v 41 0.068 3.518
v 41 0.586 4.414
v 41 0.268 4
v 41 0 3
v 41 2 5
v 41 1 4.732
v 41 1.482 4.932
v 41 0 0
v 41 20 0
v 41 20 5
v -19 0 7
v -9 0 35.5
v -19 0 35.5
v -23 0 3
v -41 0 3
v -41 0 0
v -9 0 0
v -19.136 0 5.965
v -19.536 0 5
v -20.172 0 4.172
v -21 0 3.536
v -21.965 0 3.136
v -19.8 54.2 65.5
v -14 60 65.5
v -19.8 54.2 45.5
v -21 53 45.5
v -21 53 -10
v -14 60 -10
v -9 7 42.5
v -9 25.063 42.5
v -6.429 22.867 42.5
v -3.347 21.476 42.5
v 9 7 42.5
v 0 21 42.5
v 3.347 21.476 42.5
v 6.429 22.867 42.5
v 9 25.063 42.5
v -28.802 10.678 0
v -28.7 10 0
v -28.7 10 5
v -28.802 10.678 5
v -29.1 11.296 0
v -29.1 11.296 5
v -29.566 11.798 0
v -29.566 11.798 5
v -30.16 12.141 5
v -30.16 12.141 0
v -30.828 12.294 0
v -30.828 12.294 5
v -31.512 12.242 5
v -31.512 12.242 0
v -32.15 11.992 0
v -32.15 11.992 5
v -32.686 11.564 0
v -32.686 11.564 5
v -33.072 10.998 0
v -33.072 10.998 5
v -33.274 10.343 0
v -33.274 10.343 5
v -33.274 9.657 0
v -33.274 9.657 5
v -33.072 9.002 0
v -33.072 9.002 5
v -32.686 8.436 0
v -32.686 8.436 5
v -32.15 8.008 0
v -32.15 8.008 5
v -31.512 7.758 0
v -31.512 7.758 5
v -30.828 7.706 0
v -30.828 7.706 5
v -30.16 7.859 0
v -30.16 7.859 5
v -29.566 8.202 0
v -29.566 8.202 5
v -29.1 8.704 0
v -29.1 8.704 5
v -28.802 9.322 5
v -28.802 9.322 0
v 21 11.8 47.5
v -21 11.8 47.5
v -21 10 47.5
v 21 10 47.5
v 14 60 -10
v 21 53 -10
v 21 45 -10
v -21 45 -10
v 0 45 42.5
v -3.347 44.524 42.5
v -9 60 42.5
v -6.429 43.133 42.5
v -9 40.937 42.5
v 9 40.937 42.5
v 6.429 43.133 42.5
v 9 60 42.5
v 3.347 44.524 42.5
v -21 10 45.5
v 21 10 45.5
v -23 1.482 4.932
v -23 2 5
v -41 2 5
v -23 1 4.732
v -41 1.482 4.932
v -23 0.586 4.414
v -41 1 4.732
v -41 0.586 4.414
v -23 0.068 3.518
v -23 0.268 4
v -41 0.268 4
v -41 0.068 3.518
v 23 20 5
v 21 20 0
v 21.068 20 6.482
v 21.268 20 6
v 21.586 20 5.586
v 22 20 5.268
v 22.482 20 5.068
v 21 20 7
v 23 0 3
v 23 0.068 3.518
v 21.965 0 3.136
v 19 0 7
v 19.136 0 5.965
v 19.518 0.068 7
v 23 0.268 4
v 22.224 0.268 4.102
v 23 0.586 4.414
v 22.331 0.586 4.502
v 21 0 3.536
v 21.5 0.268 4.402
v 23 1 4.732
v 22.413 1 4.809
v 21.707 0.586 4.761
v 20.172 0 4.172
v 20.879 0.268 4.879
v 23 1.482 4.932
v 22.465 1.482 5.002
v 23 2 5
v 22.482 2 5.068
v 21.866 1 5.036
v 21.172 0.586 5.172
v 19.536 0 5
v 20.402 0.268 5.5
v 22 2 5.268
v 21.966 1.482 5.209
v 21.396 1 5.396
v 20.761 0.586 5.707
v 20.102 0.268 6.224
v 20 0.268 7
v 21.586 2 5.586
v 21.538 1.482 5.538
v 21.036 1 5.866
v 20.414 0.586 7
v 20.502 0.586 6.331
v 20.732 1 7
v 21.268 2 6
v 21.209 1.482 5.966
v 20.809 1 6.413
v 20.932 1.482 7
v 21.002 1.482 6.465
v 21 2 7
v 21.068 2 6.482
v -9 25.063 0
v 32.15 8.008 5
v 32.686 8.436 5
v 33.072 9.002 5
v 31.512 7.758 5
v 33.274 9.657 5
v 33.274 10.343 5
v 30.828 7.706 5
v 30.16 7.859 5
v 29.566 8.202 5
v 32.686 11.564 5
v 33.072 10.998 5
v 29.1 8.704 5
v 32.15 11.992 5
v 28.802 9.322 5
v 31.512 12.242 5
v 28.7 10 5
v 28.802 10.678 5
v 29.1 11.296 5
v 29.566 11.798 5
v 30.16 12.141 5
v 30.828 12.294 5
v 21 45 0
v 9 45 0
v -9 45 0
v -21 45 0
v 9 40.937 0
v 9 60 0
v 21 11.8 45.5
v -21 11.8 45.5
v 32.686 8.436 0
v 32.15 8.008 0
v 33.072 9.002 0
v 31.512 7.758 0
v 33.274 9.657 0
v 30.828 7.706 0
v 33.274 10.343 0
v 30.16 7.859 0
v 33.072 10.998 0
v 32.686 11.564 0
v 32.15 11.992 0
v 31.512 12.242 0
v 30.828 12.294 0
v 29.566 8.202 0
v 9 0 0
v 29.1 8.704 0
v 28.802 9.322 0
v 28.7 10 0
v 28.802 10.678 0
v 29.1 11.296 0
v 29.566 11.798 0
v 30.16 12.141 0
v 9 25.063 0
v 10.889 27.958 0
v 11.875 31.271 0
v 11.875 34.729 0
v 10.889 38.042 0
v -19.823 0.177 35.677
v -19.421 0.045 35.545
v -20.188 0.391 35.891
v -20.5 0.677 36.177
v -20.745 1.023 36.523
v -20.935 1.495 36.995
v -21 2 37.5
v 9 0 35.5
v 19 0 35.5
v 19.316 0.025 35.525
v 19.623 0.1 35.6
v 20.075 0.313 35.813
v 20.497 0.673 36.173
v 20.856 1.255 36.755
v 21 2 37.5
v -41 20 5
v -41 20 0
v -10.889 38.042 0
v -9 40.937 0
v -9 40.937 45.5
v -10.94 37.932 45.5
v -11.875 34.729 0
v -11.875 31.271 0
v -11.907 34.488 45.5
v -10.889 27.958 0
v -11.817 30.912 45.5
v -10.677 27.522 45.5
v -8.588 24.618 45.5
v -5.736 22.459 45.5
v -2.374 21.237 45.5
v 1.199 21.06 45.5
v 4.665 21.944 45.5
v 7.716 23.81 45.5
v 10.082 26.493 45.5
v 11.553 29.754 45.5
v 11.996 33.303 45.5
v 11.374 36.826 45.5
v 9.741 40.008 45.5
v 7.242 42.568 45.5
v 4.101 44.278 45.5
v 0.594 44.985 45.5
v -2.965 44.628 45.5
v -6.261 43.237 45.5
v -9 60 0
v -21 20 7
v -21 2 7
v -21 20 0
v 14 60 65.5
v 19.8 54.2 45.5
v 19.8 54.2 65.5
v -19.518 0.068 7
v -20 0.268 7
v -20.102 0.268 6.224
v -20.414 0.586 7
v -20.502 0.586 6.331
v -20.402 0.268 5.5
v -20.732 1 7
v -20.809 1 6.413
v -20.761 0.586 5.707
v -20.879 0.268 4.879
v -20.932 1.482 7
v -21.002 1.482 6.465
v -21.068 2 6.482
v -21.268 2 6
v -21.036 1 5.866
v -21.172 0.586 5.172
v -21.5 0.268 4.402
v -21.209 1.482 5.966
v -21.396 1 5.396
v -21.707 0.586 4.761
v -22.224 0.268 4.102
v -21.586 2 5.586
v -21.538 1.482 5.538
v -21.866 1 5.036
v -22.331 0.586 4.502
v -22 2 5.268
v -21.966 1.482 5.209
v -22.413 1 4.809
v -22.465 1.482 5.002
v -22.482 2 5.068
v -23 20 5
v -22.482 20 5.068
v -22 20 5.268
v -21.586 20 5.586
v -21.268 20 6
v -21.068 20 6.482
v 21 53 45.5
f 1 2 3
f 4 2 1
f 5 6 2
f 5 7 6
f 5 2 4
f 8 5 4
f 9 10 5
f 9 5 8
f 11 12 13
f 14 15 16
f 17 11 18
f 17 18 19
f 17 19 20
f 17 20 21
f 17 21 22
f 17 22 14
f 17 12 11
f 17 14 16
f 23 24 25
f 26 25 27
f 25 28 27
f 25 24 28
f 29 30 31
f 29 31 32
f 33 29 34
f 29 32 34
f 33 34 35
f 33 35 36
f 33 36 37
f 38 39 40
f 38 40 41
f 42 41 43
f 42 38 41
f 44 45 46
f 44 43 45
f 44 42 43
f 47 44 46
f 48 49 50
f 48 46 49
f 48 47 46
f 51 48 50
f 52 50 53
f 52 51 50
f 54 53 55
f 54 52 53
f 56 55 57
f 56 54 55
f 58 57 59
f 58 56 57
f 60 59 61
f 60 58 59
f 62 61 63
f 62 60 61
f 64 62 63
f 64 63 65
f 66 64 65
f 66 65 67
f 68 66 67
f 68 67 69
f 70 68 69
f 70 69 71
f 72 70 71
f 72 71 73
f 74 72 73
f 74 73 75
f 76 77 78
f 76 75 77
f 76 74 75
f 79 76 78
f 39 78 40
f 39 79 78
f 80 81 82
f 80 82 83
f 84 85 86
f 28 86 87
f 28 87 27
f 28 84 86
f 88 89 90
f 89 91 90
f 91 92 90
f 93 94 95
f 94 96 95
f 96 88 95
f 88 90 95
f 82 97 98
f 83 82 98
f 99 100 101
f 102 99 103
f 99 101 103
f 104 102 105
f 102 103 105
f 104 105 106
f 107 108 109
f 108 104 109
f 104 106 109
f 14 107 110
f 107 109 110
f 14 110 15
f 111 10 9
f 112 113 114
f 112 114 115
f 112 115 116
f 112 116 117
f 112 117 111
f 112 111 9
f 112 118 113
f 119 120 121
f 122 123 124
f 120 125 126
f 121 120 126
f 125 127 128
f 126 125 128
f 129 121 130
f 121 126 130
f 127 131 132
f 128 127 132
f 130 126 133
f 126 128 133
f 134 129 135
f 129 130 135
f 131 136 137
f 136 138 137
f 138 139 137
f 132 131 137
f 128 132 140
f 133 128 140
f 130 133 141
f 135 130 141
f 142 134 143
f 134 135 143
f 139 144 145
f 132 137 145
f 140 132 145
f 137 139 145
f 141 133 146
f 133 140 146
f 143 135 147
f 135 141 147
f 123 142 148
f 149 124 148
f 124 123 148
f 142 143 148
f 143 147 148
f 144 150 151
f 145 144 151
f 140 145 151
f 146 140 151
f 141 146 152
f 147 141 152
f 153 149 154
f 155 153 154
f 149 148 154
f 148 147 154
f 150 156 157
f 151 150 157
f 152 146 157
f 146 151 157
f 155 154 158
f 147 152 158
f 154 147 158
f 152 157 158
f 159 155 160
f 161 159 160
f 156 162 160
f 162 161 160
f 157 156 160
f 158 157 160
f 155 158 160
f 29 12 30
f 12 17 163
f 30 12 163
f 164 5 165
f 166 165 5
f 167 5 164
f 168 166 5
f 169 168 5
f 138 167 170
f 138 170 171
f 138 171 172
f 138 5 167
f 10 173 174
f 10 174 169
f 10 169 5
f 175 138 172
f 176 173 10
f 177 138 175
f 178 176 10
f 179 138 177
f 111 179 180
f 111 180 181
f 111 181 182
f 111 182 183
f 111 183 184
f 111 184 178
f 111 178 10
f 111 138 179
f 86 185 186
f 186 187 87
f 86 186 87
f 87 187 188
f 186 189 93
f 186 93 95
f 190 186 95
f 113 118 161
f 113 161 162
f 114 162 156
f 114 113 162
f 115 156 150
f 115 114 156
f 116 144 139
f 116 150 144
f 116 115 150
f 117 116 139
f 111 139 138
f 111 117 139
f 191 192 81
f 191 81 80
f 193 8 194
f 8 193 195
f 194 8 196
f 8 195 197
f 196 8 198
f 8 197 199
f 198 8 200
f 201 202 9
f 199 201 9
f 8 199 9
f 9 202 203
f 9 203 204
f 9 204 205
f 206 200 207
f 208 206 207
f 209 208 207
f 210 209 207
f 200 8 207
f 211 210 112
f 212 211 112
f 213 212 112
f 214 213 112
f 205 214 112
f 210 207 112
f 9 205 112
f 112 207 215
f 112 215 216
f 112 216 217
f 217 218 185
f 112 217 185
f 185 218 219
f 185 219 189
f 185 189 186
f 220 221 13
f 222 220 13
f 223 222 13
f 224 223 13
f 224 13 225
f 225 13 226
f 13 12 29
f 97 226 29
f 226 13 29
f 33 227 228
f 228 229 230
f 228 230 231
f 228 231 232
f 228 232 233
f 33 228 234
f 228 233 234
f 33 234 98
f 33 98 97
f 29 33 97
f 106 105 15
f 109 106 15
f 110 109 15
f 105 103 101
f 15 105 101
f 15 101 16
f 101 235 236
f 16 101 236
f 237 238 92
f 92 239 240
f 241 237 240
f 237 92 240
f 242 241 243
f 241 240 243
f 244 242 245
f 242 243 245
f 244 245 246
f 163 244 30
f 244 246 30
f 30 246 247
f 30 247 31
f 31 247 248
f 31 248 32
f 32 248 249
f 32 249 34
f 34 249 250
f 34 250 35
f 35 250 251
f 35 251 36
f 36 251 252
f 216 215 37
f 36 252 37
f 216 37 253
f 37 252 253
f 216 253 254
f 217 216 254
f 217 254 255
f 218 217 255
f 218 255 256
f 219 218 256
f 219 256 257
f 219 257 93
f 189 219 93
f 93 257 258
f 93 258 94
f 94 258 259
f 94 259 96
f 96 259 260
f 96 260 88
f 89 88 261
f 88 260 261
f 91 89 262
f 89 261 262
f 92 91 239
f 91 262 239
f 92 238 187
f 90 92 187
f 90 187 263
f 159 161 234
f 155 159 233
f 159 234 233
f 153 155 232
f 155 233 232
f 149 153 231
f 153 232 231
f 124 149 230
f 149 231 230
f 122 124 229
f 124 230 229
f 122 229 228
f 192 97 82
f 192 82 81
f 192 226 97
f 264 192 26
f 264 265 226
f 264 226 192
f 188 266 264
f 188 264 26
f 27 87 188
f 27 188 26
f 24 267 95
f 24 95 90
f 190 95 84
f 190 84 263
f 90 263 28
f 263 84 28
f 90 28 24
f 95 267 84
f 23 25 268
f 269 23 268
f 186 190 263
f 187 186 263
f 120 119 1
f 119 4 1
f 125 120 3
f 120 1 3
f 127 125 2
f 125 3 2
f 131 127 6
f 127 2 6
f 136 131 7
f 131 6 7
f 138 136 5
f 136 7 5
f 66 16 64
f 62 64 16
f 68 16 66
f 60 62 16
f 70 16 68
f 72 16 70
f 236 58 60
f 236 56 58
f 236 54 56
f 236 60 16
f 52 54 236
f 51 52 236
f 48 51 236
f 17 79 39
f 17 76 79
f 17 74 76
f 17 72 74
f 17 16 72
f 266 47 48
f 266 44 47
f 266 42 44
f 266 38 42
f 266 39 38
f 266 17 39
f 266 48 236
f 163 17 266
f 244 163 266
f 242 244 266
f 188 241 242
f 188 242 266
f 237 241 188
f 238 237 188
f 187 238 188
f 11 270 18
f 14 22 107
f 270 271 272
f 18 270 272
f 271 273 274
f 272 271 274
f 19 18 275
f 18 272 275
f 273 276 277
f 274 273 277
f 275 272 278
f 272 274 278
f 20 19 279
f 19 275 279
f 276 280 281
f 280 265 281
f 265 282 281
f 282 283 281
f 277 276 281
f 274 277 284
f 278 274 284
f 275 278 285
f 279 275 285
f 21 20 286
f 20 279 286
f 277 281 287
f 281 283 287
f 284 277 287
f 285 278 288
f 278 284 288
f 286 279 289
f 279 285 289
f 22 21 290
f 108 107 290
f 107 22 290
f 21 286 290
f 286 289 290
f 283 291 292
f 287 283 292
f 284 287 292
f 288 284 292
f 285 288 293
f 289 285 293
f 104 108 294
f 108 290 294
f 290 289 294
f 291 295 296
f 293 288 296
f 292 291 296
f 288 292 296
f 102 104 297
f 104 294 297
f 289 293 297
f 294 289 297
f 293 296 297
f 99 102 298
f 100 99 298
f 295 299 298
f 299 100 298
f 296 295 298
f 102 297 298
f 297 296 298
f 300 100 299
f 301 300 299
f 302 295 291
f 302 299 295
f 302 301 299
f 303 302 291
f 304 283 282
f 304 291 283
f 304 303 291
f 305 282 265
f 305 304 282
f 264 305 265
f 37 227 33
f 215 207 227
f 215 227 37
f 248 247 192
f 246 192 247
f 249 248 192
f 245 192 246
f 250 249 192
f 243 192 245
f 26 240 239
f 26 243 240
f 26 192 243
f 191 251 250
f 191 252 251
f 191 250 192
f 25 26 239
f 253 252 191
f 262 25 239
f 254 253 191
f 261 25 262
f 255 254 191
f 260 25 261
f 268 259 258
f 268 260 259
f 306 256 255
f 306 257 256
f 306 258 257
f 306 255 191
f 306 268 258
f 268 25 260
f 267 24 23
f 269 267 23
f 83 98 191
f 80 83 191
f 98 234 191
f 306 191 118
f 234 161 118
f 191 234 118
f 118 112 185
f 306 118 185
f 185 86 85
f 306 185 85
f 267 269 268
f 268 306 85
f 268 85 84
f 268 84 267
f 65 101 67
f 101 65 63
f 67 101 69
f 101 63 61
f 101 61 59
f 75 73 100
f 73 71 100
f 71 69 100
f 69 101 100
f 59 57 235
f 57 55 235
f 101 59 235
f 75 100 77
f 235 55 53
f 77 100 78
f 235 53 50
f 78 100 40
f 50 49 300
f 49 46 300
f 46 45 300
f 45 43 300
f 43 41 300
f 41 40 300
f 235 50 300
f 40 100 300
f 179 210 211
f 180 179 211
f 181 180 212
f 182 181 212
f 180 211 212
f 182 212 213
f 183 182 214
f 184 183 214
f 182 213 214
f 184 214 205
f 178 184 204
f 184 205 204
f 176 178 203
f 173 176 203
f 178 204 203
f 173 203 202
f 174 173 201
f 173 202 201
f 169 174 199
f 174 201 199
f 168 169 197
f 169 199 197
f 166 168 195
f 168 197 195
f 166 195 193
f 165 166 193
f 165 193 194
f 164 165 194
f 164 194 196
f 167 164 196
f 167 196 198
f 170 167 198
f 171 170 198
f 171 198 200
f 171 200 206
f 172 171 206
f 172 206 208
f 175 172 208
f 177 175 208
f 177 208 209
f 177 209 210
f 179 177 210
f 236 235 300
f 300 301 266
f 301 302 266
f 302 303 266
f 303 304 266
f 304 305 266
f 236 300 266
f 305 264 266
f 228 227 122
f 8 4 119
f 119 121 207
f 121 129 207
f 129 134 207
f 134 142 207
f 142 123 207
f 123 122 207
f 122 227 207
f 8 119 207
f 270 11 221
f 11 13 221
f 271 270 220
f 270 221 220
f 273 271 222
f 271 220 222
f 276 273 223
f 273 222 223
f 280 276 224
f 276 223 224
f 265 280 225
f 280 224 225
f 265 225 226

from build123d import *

# Parameters (mm, degrees)
SKETCH_1_W          = 12
SKETCH_1_H          = 60
EXTRUDE_1_DEPTH     = 42.5
EXTRUDE_1_2_DEPTH   = 42.5
SKETCH_2_W          = 42
SKETCH_2_H          = 60
SKETCH_2_R          = 12
EXTRUDE_2_DEPTH     = 3
SKETCH_3_R          = 12
CUT_EXTRUDE_1_DEPTH = 79.174484328
SKETCH_4_W          = 42
SKETCH_4_H          = 15
EXTRUDE_3_DEPTH     = 10
CHAMFER_1_SIZE      = 10
SKETCH_5_W          = 5
SKETCH_5_H          = 20
EXTRUDE_4_DEPTH     = 20
HOLE_WIZARD_M4_1_D  = 4.6
FILLET_1_R          = 2
CHAMFER_2_SIZE      = 7
EXTRUDE_5_DEPTH     = 20
SKETCH_9_W          = 42
SKETCH_9_H          = 1.8
EXTRUDE_6_DEPTH     = 2


with BuildPart() as part:
    # 스케치1 → 보스-돌출1 (new body)
    with BuildSketch(Plane.XY):
        with Locations((-15, 30)):
            Rectangle(SKETCH_1_W, SKETCH_1_H)
    extrude(amount=EXTRUDE_1_DEPTH)



with BuildPart() as body_2:
    # 스케치1 → Extrude 1 2 (new body)
    with BuildSketch(Plane.XY):
        with Locations((15, 30)):
            Rectangle(SKETCH_1_W, SKETCH_1_H)
    extrude(amount=EXTRUDE_1_2_DEPTH)


with BuildPart() as part_1:
    add(part.part)

    add(body_2.part)  # 보스-돌출2 merges body 2
    # 스케치2 → 보스-돌출2 (add)
    with BuildSketch(Plane.XY.offset(42.5)):
        with Locations((0, 30)):
            Rectangle(SKETCH_2_W, SKETCH_2_H)
        with Locations(Location((0, 33, 0), (0, 0, 138.590377891))):
            Circle(SKETCH_2_R, mode=Mode.SUBTRACT)
    extrude(amount=EXTRUDE_2_DEPTH)

    # 스케치3 → 컷-돌출1 (cut, through all)
    with BuildSketch(Plane.XY.offset(45.5)):
        with Locations(Location((0, 33, 0), (0, 0, 138.590377891))):
            Circle(SKETCH_3_R)
    extrude(amount=-CUT_EXTRUDE_1_DEPTH, mode=Mode.SUBTRACT)

    # 스케치4 → 보스-돌출3 (add)
    with BuildSketch(Plane(origin=(0, 0, 0), x_dir=(-1, 0, 0), z_dir=(0, 0, -1))):
        with Locations((0, 52.5)):
            Rectangle(SKETCH_4_W, SKETCH_4_H)
    extrude(amount=EXTRUDE_3_DEPTH)

    # 모따기1
    # the kernel refuses this chamfer: 10 mm, written as the material it takes off along each edge
    with BuildSketch(Plane(origin=(46.71682988, 0, 45.5), x_dir=(0, -0.02749587661058638, -0.9996219169112968), z_dir=(-1, 0, 0))) as chamfer_1_piece_1:
        Polygon((CHAMFER_1_SIZE * 0.999621916911, -CHAMFER_1_SIZE * 0.0274958766106), (-CHAMFER_1_SIZE * 0.0274958766106, -CHAMFER_1_SIZE * 0.999621916911), (0, 0), align=None)
    extrude(amount=93.433659759, mode=Mode.SUBTRACT)

    # 스케치5 → 보스-돌출4 (add)
    with BuildSketch(Plane(origin=(21, 0, 0), x_dir=(0, 0, -1), z_dir=(1, 0, 0))):
        with Locations((-2.5, 10)):
            Rectangle(SKETCH_5_W, SKETCH_5_H)
    extrude_4 = extrude(amount=EXTRUDE_4_DEPTH)

    # M4 여유 구멍1 (through all)
    with Locations(Plane.XY.offset(5)):
        with Locations((31, 10)):
            hole_wizard_m4_1 = Hole(HOLE_WIZARD_M4_1_D / 2)

    # 대칭 복사1: 보스-돌출4, M4 여유 구멍1 across plane
    add(extrude_4.mirror(Plane(origin=(0, 0, 0), x_dir=(0, 0, 1), z_dir=(1, 0, 0))))
    add(hole_wizard_m4_1.mirror(Plane(origin=(0, 0, 0), x_dir=(0, 0, 1), z_dir=(1, 0, 0))), mode=Mode.SUBTRACT)

    # 필렛1
    fillet_1_edges = [part_1.edges().sort_by_distance(p)[0] for p in [
        (21, 0, 20.25),
        (-21, 0, 20.25),
        (21, 10, 5),
        (31, 0, 5),
        (-31, 0, 5),
        (-21, 10, 5),
    ]]
    fillet(fillet_1_edges, radius=FILLET_1_R)

    # 모따기2
    chamfer_2_edges = [part_1.edges().sort_by_distance(p)[0] for p in [
        (21, 60, 17.75),
        (-21, 60, 17.75),
    ]]
    chamfer(chamfer_2_edges, length=CHAMFER_2_SIZE)

    # 스케치8 → 보스-돌출5 (add)
    with BuildSketch(Plane.XY.offset(45.5)):
        Polygon((-19.8, 54.2), (19.8, 54.2), (14, 60), (-14, 60), align=None)
    extrude(amount=EXTRUDE_5_DEPTH)

    # 스케치9 → 보스-돌출6 (add)
    with BuildSketch(Plane.XY.offset(45.5)):
        with Locations((0, 10.9)):
            Rectangle(SKETCH_9_W, SKETCH_9_H)
    extrude(amount=EXTRUDE_6_DEPTH)


solid = part_1.part
